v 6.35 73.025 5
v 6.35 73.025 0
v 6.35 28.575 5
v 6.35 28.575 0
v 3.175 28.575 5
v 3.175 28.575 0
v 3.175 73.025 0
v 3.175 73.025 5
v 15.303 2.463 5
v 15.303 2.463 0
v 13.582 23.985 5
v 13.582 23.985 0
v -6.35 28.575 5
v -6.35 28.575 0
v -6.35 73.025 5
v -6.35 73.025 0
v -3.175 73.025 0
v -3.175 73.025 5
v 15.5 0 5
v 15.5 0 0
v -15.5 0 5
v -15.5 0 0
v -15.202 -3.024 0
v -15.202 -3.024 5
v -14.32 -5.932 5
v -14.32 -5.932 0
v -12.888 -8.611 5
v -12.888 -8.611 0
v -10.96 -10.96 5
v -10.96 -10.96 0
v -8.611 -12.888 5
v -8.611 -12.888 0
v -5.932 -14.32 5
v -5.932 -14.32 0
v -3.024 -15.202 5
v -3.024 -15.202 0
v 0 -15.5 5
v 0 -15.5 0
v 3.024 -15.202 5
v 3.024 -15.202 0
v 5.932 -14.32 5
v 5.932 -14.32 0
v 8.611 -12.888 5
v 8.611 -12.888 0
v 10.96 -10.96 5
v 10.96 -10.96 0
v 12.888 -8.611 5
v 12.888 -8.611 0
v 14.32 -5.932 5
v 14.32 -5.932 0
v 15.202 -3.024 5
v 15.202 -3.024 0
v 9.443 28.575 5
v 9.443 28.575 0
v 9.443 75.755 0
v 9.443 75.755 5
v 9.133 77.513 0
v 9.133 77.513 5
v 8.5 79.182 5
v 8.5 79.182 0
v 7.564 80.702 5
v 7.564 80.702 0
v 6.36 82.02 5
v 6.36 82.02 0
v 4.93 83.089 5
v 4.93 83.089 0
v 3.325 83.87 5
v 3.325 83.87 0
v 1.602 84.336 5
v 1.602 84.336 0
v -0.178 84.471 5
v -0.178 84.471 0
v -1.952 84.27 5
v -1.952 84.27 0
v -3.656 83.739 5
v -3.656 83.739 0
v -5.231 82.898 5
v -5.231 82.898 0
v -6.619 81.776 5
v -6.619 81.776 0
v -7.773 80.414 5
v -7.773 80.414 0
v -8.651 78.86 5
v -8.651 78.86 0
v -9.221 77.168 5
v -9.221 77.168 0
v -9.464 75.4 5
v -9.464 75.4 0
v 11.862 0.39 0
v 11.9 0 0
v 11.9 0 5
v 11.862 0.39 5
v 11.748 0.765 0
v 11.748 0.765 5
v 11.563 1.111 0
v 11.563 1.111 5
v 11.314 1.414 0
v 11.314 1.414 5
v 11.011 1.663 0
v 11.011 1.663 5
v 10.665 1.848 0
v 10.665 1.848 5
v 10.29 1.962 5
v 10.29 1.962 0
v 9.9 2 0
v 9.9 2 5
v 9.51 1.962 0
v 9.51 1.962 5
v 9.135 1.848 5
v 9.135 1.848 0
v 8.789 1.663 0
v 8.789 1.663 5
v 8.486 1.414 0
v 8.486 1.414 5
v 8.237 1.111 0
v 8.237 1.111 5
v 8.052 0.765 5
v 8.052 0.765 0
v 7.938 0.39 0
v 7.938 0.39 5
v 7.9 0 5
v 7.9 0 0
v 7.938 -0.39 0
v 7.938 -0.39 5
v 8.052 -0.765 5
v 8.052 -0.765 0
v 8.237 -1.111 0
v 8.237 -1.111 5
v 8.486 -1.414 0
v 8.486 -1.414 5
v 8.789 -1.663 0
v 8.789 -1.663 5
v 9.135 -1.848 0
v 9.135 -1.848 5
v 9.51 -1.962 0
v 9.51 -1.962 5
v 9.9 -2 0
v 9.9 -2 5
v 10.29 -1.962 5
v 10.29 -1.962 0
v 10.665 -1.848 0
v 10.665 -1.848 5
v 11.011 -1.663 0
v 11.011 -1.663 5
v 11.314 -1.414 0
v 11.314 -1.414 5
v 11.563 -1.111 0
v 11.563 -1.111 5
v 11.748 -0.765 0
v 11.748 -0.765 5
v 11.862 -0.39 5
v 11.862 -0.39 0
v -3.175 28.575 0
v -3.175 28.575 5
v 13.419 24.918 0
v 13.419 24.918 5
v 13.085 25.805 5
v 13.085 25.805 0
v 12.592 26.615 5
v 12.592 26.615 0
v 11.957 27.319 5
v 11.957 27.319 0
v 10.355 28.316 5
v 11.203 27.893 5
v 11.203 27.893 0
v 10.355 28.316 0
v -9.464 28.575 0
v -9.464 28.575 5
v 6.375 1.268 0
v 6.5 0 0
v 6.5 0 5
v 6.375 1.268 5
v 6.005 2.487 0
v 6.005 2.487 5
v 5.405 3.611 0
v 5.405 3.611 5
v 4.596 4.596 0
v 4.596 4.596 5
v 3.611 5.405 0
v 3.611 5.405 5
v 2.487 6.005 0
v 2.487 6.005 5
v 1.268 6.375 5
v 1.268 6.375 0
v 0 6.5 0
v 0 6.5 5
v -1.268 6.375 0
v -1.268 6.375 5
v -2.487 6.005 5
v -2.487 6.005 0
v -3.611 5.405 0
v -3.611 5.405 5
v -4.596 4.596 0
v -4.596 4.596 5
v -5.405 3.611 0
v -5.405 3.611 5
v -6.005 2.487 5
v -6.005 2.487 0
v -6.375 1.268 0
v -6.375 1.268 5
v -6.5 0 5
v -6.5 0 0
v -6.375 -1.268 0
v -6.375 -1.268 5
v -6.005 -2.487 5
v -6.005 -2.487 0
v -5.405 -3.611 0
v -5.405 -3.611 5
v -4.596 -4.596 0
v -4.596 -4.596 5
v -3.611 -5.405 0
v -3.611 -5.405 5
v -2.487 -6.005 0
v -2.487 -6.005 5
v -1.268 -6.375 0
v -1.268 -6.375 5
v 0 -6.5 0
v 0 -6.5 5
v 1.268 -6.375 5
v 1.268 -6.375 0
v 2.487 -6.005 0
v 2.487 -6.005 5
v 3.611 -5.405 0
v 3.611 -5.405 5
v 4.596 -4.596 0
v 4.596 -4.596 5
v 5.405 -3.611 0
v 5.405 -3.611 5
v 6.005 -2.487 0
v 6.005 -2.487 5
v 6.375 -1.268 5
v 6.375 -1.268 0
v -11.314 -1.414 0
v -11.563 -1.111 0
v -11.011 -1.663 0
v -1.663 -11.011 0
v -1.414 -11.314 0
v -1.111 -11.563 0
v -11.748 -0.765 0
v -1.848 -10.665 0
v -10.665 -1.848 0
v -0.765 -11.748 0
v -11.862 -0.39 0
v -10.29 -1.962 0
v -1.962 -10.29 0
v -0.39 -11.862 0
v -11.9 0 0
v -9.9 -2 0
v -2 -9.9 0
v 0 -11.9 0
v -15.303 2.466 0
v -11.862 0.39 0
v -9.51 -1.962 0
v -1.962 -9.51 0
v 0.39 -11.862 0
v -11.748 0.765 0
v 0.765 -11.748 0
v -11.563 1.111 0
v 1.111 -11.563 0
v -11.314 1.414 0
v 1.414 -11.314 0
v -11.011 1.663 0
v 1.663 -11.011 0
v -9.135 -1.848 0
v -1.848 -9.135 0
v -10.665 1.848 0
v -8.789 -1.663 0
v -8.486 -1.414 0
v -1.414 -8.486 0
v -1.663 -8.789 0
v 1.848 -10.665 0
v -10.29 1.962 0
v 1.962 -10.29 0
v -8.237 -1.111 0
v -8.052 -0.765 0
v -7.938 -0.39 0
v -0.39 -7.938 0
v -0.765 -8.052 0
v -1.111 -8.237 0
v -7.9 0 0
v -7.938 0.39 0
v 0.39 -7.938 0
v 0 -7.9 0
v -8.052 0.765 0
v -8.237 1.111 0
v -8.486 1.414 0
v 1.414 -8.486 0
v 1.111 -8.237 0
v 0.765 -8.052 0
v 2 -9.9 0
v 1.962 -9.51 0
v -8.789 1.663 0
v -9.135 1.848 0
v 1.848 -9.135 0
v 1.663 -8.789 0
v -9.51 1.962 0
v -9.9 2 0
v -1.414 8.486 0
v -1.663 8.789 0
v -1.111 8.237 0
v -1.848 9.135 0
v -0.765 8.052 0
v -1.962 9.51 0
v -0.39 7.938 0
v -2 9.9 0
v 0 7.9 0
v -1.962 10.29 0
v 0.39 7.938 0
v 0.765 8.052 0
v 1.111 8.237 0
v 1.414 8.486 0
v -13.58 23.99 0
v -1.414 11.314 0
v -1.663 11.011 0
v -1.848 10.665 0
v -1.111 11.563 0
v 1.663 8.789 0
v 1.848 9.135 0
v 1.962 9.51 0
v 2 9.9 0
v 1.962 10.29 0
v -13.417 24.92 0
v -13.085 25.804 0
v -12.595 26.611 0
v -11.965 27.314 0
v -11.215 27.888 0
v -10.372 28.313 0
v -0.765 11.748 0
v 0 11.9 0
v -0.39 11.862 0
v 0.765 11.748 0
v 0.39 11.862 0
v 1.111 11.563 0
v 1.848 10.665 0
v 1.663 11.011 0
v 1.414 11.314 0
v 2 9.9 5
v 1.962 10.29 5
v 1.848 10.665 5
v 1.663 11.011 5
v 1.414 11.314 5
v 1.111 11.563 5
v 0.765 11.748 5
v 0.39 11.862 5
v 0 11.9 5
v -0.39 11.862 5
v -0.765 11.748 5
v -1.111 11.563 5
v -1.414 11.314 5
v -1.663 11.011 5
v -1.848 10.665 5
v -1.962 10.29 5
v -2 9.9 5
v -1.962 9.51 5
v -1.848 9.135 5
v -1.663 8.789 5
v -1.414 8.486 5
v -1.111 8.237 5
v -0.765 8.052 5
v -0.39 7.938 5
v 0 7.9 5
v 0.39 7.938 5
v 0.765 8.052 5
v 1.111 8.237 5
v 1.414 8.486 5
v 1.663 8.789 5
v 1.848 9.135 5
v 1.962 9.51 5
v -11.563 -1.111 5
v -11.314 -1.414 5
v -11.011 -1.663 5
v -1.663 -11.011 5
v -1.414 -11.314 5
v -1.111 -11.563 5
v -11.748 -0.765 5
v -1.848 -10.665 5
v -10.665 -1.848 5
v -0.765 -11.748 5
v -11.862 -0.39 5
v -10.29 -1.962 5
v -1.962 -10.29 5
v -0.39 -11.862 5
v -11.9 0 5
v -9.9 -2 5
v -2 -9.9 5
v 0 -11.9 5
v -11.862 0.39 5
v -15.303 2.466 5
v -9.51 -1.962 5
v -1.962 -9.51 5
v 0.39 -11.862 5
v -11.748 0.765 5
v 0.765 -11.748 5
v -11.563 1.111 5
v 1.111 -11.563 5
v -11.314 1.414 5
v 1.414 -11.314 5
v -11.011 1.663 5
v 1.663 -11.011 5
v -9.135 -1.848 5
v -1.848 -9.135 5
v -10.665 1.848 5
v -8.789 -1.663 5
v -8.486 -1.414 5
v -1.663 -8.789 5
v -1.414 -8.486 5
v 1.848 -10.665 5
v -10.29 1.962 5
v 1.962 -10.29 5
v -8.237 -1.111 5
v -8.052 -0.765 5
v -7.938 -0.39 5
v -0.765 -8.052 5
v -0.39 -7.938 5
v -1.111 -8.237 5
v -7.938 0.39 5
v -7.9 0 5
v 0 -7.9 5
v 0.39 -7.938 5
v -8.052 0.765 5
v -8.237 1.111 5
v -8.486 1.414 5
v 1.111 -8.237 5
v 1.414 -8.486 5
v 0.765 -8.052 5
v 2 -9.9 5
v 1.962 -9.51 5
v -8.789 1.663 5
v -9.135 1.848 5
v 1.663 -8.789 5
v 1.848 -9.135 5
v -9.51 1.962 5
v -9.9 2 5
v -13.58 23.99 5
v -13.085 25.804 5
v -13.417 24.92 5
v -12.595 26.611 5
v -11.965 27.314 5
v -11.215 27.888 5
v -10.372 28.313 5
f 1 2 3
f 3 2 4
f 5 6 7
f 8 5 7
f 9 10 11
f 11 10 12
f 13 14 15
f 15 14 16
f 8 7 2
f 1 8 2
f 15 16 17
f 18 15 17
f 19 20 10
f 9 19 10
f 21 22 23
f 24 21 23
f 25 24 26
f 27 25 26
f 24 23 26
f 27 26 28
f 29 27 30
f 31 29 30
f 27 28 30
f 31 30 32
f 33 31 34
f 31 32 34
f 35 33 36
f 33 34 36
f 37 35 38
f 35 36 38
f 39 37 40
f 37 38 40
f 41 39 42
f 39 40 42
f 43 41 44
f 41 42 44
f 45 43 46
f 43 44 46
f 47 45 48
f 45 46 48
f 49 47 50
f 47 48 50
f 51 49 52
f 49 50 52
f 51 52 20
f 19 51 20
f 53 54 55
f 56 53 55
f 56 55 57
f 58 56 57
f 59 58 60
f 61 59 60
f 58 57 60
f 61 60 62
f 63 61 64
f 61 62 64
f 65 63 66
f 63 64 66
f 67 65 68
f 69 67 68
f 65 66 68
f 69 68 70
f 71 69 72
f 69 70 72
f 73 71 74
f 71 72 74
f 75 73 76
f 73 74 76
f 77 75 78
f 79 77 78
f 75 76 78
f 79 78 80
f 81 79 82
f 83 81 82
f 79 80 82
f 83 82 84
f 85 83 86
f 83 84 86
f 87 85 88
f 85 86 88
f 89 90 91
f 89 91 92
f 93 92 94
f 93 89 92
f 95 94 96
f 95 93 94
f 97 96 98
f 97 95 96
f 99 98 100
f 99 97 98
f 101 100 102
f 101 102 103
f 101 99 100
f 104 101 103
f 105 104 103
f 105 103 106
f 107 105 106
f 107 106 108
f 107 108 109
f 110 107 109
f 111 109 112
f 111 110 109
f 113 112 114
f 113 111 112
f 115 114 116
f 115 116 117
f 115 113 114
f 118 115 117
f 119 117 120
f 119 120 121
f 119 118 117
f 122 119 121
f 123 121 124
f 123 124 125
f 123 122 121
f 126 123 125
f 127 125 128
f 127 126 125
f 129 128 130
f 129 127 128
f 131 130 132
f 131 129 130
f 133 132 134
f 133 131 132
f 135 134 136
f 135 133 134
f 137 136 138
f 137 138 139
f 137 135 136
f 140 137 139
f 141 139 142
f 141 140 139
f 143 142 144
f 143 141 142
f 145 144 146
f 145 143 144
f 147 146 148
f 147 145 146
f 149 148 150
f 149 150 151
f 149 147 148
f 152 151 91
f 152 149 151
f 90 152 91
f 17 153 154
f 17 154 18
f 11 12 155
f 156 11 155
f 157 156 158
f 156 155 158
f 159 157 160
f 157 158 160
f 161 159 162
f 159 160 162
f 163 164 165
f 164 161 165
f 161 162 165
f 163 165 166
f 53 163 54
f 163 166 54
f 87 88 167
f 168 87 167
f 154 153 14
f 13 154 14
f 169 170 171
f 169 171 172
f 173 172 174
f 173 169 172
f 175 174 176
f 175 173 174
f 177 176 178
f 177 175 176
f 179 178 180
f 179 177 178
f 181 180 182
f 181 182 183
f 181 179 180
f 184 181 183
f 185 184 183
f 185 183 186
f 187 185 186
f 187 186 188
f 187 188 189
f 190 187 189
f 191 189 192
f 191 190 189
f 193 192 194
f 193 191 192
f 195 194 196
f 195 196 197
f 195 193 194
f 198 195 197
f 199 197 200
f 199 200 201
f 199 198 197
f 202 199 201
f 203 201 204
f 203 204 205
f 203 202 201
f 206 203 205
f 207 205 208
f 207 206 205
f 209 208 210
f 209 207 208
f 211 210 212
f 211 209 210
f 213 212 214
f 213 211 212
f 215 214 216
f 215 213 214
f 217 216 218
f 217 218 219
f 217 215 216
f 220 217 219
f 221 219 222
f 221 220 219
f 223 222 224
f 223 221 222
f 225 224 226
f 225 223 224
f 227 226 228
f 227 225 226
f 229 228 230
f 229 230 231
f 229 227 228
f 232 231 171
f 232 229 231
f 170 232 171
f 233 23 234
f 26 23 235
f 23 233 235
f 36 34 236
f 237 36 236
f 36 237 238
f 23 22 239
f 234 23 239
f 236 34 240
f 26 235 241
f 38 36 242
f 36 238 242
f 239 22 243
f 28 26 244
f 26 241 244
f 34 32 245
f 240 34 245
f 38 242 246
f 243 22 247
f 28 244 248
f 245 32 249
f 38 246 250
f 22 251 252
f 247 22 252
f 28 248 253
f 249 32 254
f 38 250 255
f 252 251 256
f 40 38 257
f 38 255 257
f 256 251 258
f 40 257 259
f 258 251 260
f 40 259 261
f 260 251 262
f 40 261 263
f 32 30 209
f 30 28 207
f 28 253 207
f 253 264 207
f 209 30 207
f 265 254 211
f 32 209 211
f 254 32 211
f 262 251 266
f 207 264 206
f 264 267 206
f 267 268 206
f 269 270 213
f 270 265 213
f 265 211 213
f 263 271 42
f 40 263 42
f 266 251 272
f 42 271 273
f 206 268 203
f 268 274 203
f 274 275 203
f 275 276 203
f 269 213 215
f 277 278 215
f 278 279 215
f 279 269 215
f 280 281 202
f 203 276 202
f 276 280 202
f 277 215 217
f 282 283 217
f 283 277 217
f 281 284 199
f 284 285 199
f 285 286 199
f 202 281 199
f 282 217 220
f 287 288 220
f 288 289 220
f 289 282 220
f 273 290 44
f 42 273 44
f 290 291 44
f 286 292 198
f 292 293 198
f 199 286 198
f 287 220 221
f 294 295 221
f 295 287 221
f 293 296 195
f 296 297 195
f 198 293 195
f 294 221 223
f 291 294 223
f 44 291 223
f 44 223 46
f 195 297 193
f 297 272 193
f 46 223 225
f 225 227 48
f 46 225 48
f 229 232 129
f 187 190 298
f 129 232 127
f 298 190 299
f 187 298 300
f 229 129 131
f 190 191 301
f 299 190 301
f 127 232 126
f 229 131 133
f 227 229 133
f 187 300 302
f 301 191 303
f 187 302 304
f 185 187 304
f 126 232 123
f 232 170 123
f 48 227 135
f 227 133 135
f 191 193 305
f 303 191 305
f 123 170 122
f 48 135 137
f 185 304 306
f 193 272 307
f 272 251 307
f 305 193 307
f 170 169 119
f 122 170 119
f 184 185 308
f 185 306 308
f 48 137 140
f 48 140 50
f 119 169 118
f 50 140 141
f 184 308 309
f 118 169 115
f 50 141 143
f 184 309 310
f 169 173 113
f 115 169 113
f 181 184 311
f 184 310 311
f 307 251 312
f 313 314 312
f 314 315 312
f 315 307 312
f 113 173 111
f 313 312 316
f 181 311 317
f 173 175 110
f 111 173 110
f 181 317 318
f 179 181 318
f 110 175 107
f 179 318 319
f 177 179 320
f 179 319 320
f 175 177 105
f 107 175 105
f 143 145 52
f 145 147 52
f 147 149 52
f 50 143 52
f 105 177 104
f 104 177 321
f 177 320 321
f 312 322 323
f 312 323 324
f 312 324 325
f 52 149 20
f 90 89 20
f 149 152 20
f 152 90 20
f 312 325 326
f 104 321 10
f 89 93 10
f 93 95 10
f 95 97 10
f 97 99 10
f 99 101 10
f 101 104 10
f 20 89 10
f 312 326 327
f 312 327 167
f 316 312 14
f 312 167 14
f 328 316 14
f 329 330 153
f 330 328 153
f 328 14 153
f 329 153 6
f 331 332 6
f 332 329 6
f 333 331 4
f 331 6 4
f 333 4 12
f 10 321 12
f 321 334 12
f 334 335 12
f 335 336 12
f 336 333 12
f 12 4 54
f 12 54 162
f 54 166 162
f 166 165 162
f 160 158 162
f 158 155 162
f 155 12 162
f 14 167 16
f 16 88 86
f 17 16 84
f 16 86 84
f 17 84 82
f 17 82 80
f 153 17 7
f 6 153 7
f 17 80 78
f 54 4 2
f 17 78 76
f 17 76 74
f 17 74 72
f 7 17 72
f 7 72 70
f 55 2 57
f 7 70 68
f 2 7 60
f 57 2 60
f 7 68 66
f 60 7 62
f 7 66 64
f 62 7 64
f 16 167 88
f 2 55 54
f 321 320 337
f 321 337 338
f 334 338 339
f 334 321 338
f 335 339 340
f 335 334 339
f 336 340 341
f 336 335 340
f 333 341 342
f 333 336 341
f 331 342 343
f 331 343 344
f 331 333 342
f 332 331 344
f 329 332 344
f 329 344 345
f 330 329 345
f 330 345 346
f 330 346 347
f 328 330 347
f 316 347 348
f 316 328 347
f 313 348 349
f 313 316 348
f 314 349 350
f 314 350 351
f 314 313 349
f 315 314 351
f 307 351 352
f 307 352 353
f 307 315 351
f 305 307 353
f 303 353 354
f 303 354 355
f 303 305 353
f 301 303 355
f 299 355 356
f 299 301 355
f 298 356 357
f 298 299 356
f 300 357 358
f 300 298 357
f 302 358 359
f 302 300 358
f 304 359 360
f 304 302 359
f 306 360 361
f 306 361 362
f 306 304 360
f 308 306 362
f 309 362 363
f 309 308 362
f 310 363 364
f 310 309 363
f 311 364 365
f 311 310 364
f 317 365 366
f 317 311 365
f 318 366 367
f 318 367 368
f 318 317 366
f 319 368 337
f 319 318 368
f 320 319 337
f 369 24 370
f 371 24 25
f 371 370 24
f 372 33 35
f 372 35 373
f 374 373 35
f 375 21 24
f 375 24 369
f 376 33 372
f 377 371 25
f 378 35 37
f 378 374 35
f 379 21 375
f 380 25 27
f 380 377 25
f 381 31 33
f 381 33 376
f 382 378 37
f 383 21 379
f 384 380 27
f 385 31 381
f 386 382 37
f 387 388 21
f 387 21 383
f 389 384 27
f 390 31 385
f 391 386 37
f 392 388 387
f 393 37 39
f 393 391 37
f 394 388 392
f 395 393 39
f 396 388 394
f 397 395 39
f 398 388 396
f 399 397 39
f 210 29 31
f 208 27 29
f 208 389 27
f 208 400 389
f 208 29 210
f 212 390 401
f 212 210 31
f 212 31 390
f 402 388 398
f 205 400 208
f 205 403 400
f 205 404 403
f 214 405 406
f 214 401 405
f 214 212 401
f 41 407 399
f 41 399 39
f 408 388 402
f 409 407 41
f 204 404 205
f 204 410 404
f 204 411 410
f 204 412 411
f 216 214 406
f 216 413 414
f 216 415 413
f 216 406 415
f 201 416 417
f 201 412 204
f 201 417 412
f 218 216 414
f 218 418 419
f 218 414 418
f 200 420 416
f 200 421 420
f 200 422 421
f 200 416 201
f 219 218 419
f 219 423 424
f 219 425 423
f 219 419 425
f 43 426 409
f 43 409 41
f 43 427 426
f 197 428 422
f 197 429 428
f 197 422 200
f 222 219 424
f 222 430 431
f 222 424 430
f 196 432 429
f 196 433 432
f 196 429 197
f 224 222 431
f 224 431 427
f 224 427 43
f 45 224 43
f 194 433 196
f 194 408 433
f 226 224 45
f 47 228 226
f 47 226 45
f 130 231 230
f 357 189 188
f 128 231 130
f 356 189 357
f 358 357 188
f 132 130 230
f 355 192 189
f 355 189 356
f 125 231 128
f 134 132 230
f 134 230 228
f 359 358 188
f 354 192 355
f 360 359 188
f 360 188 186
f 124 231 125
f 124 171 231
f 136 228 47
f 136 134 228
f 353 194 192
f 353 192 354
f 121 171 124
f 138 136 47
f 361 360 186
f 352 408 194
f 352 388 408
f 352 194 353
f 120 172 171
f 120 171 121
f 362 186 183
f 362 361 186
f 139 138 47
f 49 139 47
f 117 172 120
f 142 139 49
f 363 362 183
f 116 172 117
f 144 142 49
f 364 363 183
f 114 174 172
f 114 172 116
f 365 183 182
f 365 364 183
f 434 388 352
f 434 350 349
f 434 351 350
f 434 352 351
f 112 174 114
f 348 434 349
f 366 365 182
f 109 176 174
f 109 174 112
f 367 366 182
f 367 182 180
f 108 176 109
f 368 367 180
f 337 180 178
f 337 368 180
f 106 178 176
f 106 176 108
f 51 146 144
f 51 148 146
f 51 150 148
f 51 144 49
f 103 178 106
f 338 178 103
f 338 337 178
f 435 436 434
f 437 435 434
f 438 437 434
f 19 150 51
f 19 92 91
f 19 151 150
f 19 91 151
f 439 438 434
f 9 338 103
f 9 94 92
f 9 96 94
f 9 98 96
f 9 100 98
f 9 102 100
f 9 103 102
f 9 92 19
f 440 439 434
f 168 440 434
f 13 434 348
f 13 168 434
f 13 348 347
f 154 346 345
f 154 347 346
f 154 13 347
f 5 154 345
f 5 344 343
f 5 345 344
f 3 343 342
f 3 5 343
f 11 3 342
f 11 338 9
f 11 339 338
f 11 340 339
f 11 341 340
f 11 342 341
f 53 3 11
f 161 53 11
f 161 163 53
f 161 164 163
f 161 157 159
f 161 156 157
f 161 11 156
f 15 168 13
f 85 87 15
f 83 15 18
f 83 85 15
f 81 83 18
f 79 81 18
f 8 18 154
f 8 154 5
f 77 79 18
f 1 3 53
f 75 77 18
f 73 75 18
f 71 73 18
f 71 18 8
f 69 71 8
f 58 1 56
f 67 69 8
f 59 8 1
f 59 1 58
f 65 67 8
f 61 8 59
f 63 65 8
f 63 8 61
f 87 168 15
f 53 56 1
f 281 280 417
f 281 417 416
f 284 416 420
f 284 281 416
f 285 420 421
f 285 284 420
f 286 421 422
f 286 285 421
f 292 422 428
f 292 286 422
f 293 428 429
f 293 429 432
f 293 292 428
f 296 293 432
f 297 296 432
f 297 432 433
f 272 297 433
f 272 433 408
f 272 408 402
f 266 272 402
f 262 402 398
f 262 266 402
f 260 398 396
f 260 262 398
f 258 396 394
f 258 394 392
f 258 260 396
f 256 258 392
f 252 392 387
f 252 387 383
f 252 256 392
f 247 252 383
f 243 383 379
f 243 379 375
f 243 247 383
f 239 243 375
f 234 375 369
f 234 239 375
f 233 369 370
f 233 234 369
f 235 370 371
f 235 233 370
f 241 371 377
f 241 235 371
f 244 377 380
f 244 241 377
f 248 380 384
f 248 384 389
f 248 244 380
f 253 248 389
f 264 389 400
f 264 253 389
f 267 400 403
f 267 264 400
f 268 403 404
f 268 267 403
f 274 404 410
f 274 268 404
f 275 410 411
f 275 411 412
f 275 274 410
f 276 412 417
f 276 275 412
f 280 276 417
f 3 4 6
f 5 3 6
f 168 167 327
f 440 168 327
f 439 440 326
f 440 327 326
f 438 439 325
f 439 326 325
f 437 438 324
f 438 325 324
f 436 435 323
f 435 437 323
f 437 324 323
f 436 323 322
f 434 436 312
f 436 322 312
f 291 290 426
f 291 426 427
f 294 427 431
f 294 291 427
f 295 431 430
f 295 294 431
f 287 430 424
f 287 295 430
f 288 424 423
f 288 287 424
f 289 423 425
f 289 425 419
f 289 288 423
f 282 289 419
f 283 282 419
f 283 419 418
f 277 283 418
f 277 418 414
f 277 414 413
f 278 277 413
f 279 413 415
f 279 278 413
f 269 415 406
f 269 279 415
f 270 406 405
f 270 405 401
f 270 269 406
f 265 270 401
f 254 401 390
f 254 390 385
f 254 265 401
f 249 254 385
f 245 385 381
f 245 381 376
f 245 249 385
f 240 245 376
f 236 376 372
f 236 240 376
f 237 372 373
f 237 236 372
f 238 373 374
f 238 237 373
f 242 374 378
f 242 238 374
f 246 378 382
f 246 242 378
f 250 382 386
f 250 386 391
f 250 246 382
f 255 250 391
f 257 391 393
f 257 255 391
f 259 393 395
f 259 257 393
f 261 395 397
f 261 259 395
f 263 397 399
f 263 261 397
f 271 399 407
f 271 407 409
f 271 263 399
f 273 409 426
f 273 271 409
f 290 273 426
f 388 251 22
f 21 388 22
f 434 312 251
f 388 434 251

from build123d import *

# Parameters (mm, degrees)
F0_R        = 2
F0_R_2      = 6.5
F0_W        = 6.35
F0_H        = 44.45
F1_DEPTH    = 5
F2_T1_DEPTH = 28.0247734337
F2_T3_DEPTH = 27.9999173435


# Not quite as in the source:
# - a fillet or chamfer that OpenCascade refuses, or shapes differently, is made with other operations: its cross-section is extruded or revolved along the edge and cut away or added


with BuildPart() as f1:
    # F0 (on Top) → F1 (new body)
    with BuildSketch(Plane.XY):
        with BuildLine():
            Line((-13.2125969287, 28.575), (-15.3026211582, 2.4657221432))
            ThreePointArc((-15.3026211582, 2.4657221432), (0.0013716989, 15.4999999393), (15.3030573351, 2.4630136415))
            Line((15.3030573351, 2.4630136415), (13.2151419082, 28.575))
            Line((13.2151419082, 28.575), (9.4426246963, 28.575))
            Line((9.4426246963, 28.575), (9.4426246963, 75.7550326315))
            ThreePointArc((9.4426246963, 75.7550326315), (-0.1780593733, 84.4710891818), (-9.464331693, 75.3995760688))
            Line((-9.464331693, 75.3995760688), (-9.464331693, 28.575))
            Line((-9.464331693, 28.575), (-13.2125969287, 28.575))
        make_face()
        Polygon((6.35, 73.025), (6.35, 28.575), (3.175, 28.575), (-3.175, 28.575), (-6.35, 28.575), (-6.35, 73.025), (-3.175, 73.025), (3.175, 73.025), align=None, mode=Mode.SUBTRACT)
        with BuildLine():
            Line((-15.3026211582, 2.4657221432), (-15.5, 0))
            ThreePointArc((-15.5, 0), (0, -15.5), (15.5, 0))
            Line((15.5, 0), (15.3030573351, 2.4630136415))
            ThreePointArc((15.3030573351, 2.4630136415), (0.0013716989, 15.4999999393), (-15.3026211582, 2.4657221432))
        make_face()
        with Locations((-9.9, 0)):
            Circle(F0_R, mode=Mode.SUBTRACT)
        with Locations((0, -9.9)):
            Circle(F0_R, mode=Mode.SUBTRACT)
        Circle(F0_R_2, mode=Mode.SUBTRACT)
        with Locations((9.9, 0)):
            Circle(F0_R, mode=Mode.SUBTRACT)
        with Locations((0, 9.9)):
            Circle(F0_R, mode=Mode.SUBTRACT)
        with Locations((0, 50.8)):
            Rectangle(F0_W, F0_H)
    extrude(amount=F1_DEPTH)

    # F2: fillet of radius 5.08 on 2 edges, made by hand

    # F2_s2 → F2_t1 (cut)
    with BuildSketch(Plane.XY.offset(-11.5123867168)):
        with BuildLine():
            ThreePointArc((13.5821827728, 23.9846962333), (12.2908918839, 26.9818924846), (9.4426246963, 28.575))
            Line((9.4426246963, 28.575), (13.2151419082, 28.575))
            Line((13.2151419082, 28.575), (13.5821827728, 23.9846962333))
        make_face()
    extrude(amount=F2_T1_DEPTH, mode=Mode.SUBTRACT)

    # F2_s4 → F2_t3 (cut)
    with BuildSketch(Plane.XY.offset(-11.4999586717)):
        with BuildLine():
            ThreePointArc((-9.464331693, 28.575), (-12.2964780323, 26.9774445837), (-13.579647346, 23.9896840999))
            Line((-13.579647346, 23.9896840999), (-13.2125969287, 28.575))
            Line((-13.2125969287, 28.575), (-9.464331693, 28.575))
        make_face()
    extrude(amount=F2_T3_DEPTH, mode=Mode.SUBTRACT)


solid = f1.part
